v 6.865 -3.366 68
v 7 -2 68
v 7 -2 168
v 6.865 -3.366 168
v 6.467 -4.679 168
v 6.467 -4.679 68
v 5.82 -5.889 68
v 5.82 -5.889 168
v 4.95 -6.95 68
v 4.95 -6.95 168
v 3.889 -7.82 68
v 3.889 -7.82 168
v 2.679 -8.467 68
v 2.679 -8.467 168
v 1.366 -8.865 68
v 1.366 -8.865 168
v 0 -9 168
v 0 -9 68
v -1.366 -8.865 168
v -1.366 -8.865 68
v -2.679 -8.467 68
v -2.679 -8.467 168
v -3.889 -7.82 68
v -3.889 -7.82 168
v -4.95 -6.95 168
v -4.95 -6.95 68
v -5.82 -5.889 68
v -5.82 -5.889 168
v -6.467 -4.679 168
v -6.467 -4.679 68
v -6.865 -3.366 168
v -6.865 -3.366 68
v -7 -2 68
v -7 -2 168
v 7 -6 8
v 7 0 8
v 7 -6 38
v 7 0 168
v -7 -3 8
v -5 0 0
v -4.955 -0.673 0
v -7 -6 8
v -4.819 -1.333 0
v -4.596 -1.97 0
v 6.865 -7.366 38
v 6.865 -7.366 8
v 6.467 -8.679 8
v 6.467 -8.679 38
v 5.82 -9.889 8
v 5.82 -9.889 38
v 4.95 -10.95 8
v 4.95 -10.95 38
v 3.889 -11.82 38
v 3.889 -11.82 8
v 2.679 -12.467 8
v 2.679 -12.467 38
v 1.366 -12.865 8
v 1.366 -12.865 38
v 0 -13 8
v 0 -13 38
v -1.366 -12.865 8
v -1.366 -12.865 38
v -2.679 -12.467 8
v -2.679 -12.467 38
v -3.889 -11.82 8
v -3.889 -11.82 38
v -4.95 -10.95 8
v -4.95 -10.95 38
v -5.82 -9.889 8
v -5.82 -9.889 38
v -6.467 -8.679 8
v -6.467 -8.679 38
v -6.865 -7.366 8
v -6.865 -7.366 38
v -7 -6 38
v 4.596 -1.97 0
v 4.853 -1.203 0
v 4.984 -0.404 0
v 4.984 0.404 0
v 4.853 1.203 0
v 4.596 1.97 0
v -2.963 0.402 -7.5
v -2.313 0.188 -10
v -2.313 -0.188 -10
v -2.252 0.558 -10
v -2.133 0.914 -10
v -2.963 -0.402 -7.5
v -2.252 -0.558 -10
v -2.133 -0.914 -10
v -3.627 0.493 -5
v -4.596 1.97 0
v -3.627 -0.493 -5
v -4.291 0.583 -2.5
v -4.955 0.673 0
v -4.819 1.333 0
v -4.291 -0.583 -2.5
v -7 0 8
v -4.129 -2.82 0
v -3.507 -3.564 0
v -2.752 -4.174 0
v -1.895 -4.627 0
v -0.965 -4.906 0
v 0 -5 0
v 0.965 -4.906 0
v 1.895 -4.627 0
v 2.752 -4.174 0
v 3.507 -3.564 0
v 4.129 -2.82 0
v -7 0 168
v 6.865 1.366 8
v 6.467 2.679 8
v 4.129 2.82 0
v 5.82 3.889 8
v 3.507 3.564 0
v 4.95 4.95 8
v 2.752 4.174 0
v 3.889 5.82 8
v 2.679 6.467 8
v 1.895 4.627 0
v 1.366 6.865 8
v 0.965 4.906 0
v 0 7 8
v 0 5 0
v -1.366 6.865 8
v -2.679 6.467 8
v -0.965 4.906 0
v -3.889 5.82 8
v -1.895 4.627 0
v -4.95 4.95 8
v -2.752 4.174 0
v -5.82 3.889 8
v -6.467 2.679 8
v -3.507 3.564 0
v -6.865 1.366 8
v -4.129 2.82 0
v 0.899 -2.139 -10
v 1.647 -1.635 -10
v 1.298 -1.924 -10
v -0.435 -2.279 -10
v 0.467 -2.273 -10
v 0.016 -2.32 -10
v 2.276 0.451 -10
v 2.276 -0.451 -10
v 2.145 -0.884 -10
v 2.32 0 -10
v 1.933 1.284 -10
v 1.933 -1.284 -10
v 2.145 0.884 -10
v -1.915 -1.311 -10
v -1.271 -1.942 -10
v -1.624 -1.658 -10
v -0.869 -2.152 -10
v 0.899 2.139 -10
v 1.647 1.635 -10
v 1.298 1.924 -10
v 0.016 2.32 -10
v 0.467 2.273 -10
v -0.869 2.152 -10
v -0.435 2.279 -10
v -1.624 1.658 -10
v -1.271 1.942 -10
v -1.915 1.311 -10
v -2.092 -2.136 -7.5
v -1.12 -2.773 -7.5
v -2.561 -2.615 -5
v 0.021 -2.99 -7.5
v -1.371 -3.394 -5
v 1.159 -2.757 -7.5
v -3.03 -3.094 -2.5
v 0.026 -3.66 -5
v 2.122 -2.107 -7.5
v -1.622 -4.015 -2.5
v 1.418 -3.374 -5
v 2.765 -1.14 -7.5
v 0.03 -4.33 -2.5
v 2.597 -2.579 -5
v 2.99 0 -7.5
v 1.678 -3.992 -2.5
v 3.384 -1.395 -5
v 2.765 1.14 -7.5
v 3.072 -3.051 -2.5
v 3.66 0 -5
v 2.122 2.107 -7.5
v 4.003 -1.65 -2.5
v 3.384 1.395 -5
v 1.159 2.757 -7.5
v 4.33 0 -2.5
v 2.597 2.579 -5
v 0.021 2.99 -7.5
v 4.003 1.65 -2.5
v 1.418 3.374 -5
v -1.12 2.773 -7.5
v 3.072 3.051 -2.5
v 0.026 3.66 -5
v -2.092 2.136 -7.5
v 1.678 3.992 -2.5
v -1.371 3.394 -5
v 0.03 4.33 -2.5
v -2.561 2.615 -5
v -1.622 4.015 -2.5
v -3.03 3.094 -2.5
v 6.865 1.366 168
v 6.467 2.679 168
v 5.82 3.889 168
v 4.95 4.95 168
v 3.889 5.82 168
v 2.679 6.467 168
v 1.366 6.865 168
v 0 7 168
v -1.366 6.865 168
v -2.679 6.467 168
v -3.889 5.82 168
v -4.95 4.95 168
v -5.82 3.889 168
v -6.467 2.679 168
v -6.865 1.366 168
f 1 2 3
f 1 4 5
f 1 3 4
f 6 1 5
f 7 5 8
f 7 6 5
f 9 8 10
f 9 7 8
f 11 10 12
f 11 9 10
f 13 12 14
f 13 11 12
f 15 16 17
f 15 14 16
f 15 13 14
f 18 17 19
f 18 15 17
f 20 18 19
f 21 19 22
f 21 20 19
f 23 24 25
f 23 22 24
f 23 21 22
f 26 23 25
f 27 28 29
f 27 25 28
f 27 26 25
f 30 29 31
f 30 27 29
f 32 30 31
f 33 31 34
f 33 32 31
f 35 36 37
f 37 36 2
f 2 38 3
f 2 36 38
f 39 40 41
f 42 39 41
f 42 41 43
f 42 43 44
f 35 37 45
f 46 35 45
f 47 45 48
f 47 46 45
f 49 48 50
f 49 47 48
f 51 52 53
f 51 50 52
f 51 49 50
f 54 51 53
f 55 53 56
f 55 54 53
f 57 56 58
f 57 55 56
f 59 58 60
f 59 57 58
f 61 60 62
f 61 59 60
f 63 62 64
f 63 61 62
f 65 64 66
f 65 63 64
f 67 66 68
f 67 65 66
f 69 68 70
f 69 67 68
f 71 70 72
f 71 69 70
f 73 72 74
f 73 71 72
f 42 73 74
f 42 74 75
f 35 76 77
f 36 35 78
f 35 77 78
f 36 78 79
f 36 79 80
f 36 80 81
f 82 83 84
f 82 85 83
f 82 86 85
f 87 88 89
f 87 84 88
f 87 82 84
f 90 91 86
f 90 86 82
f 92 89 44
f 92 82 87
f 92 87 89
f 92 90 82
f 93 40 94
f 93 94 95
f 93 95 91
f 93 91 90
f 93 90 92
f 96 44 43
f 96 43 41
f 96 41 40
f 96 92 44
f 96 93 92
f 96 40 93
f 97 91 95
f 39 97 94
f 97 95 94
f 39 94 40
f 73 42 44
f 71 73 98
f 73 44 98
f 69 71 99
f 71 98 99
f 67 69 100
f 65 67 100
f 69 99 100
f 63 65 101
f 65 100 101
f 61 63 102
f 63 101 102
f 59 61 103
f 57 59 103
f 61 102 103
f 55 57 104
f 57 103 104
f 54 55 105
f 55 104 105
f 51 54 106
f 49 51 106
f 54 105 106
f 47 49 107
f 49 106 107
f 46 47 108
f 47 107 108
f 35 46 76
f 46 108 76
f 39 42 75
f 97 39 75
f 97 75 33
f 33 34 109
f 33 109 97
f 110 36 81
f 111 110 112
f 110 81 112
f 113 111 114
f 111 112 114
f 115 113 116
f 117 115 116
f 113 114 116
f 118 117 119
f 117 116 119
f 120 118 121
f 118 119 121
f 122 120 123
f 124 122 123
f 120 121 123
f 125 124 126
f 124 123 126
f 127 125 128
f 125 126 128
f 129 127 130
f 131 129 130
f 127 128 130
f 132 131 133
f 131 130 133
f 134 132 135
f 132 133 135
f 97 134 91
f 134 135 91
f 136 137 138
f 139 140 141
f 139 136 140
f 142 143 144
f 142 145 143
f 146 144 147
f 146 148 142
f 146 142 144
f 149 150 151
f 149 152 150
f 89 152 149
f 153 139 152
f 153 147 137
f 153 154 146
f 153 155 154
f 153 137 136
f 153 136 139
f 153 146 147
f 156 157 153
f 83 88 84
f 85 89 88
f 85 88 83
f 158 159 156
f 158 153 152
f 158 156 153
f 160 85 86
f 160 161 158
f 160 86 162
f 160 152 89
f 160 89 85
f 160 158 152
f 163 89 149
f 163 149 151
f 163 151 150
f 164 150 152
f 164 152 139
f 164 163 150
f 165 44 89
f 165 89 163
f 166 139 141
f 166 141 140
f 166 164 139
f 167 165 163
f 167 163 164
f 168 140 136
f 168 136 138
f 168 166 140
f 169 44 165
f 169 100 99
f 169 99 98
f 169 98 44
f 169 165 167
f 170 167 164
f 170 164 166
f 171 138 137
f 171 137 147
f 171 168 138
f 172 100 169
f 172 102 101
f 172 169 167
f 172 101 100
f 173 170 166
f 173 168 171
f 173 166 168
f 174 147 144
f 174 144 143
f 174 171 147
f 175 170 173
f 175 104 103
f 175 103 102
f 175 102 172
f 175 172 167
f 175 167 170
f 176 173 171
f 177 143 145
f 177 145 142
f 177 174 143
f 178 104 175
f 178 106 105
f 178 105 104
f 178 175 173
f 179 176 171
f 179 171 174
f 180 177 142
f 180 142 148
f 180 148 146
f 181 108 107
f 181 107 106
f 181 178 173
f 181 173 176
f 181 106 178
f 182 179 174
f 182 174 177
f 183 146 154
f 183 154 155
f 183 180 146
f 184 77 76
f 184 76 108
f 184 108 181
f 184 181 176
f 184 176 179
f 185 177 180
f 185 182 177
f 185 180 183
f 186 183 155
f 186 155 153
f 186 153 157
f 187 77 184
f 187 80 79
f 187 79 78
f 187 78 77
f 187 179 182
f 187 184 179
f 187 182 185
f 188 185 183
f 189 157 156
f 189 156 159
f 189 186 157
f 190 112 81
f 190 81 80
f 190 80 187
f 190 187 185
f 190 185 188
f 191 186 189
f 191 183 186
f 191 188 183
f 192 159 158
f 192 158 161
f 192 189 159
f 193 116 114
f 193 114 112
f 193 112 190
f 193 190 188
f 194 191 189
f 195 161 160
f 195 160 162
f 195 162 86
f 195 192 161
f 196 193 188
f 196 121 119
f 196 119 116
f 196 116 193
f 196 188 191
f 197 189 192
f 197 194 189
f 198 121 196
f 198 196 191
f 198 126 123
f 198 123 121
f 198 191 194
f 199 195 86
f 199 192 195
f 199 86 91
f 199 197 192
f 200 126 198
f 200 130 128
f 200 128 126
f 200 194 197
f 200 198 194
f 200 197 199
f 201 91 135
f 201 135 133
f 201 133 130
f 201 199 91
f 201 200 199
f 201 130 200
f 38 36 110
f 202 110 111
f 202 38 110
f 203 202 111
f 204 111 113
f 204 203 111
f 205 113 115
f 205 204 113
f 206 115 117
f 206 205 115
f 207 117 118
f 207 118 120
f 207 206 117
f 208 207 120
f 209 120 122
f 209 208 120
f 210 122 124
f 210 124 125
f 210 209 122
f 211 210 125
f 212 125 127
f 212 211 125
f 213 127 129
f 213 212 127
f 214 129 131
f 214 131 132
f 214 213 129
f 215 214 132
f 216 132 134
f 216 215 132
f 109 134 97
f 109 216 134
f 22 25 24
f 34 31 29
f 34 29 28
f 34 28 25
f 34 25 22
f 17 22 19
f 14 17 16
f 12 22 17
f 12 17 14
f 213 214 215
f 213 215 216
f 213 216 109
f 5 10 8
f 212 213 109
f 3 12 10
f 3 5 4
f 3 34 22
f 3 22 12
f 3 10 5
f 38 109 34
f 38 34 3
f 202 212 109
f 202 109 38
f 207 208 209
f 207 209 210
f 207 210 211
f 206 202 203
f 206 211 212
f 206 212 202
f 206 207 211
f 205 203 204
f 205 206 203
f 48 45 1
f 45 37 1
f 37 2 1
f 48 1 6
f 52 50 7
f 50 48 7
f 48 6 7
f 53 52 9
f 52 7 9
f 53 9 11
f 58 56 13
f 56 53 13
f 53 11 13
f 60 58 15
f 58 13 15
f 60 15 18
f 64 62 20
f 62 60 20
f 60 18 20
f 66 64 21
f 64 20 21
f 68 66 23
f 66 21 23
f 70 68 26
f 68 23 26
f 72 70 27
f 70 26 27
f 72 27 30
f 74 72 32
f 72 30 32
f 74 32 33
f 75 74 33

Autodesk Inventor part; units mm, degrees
ref_plane "YZ Plane" through (0, 0, 0) normal (1, 0, 0) x (0, 1, 0)
ref_plane "XZ Plane" through (0, 0, 0) normal (0, 1, 0) x (-1, 0, 0)
sketch "Sketch4" plane through (0, 0, 0) normal (0, 0, -1) x (-1, 0, 0)
  circle A0 centre (0, 0) radius 5
  dimension "d17" = 10
ref_plane "Work Plane3" through (0, 0, 8) normal (0, 0, 1) x (1, 0, 0)
sketch "Sketch1" plane through (0, 0, 8) normal (0, 0, 1) x (1, 0, 0)
  line L0 (0, 0) -> (0, -6) construction
  line L1 (-7, 0) -> (-7, -6)
  line L2 (7, -6) -> (7, 0)
  arc A0 (7, 0) -> (-7, 0) centre (0, 0) ccw
  arc A1 (-7, -6) -> (7, -6) centre (0, -6) ccw
  point P0 (0, -3)
  dimension "d0" = 6
  dimension "d1" = 14
extrude "Extrusion1" add sketch "Sketch1" along normal blind 30
ref_plane "Work Plane1" through (0, 0, 68) normal (0, 0, 1) x (1, 0, 0)
ref_plane "Work Plane2" through (0, 0, 168) normal (0, 0, 1) x (1, 0, 0)
sketch "Sketch2" plane through (0, 0, 68) normal (0, 0, 1) x (1, 0, 0)
  line L0 (0, 0) -> (0, -2) construction
  line L1 (-7, 0) -> (-7, -2)
  line L2 (7, -2) -> (7, 0)
  arc A0 (7, 0) -> (-7, 0) centre (0, 0) ccw
  arc A1 (-7, -2) -> (7, -2) centre (0, -2) ccw
  point P0 (0, -1)
  dimension "d4" = 2
extrude "Extrusion2" add sketch "Sketch2" along normal up to surface (100 mm away)
loft "Loft1" add section 1 edges at (0, -13, 38) (7, -3, 38) (0, 7, 38) (-7, -3, 38) section 2 edges at (0, -9, 68) (-7, -1, 68) (0, 7, 68) (7, -1, 68)
ref_plane "Work Plane4" through (0, 0, 38) normal (0, 0, 1) x (1, 0, 0)
loft "Loft2" add profiles "Sketch4" section 1 edges at (0, -13, 8) (-7, -3, 8) (0, 7, 8) (7, -3, 8)
sketch "Sketch5" plane through (0, 0, 0) normal (0, 0, -1) x (-1, 0, 0)
  arc A0 (-4.5957, -1.9696) -> (4.5957, -1.9696) centre (0, 0) ccw projected
  arc A1 (4.5957, -1.9696) -> (4.5957, 1.9696) centre (0, 0) ccw projected
  arc A2 (4.5957, 1.9696) -> (-4.5957, 1.9696) centre (0, 0) ccw projected
  arc A3 (-4.5957, 1.9696) -> (-4.5957, -1.9696) centre (0, 0) ccw projected
extrude "Extrusion4" add sketch "Sketch5" along normal blind 10 draft -15
properties part number "Form_test"
